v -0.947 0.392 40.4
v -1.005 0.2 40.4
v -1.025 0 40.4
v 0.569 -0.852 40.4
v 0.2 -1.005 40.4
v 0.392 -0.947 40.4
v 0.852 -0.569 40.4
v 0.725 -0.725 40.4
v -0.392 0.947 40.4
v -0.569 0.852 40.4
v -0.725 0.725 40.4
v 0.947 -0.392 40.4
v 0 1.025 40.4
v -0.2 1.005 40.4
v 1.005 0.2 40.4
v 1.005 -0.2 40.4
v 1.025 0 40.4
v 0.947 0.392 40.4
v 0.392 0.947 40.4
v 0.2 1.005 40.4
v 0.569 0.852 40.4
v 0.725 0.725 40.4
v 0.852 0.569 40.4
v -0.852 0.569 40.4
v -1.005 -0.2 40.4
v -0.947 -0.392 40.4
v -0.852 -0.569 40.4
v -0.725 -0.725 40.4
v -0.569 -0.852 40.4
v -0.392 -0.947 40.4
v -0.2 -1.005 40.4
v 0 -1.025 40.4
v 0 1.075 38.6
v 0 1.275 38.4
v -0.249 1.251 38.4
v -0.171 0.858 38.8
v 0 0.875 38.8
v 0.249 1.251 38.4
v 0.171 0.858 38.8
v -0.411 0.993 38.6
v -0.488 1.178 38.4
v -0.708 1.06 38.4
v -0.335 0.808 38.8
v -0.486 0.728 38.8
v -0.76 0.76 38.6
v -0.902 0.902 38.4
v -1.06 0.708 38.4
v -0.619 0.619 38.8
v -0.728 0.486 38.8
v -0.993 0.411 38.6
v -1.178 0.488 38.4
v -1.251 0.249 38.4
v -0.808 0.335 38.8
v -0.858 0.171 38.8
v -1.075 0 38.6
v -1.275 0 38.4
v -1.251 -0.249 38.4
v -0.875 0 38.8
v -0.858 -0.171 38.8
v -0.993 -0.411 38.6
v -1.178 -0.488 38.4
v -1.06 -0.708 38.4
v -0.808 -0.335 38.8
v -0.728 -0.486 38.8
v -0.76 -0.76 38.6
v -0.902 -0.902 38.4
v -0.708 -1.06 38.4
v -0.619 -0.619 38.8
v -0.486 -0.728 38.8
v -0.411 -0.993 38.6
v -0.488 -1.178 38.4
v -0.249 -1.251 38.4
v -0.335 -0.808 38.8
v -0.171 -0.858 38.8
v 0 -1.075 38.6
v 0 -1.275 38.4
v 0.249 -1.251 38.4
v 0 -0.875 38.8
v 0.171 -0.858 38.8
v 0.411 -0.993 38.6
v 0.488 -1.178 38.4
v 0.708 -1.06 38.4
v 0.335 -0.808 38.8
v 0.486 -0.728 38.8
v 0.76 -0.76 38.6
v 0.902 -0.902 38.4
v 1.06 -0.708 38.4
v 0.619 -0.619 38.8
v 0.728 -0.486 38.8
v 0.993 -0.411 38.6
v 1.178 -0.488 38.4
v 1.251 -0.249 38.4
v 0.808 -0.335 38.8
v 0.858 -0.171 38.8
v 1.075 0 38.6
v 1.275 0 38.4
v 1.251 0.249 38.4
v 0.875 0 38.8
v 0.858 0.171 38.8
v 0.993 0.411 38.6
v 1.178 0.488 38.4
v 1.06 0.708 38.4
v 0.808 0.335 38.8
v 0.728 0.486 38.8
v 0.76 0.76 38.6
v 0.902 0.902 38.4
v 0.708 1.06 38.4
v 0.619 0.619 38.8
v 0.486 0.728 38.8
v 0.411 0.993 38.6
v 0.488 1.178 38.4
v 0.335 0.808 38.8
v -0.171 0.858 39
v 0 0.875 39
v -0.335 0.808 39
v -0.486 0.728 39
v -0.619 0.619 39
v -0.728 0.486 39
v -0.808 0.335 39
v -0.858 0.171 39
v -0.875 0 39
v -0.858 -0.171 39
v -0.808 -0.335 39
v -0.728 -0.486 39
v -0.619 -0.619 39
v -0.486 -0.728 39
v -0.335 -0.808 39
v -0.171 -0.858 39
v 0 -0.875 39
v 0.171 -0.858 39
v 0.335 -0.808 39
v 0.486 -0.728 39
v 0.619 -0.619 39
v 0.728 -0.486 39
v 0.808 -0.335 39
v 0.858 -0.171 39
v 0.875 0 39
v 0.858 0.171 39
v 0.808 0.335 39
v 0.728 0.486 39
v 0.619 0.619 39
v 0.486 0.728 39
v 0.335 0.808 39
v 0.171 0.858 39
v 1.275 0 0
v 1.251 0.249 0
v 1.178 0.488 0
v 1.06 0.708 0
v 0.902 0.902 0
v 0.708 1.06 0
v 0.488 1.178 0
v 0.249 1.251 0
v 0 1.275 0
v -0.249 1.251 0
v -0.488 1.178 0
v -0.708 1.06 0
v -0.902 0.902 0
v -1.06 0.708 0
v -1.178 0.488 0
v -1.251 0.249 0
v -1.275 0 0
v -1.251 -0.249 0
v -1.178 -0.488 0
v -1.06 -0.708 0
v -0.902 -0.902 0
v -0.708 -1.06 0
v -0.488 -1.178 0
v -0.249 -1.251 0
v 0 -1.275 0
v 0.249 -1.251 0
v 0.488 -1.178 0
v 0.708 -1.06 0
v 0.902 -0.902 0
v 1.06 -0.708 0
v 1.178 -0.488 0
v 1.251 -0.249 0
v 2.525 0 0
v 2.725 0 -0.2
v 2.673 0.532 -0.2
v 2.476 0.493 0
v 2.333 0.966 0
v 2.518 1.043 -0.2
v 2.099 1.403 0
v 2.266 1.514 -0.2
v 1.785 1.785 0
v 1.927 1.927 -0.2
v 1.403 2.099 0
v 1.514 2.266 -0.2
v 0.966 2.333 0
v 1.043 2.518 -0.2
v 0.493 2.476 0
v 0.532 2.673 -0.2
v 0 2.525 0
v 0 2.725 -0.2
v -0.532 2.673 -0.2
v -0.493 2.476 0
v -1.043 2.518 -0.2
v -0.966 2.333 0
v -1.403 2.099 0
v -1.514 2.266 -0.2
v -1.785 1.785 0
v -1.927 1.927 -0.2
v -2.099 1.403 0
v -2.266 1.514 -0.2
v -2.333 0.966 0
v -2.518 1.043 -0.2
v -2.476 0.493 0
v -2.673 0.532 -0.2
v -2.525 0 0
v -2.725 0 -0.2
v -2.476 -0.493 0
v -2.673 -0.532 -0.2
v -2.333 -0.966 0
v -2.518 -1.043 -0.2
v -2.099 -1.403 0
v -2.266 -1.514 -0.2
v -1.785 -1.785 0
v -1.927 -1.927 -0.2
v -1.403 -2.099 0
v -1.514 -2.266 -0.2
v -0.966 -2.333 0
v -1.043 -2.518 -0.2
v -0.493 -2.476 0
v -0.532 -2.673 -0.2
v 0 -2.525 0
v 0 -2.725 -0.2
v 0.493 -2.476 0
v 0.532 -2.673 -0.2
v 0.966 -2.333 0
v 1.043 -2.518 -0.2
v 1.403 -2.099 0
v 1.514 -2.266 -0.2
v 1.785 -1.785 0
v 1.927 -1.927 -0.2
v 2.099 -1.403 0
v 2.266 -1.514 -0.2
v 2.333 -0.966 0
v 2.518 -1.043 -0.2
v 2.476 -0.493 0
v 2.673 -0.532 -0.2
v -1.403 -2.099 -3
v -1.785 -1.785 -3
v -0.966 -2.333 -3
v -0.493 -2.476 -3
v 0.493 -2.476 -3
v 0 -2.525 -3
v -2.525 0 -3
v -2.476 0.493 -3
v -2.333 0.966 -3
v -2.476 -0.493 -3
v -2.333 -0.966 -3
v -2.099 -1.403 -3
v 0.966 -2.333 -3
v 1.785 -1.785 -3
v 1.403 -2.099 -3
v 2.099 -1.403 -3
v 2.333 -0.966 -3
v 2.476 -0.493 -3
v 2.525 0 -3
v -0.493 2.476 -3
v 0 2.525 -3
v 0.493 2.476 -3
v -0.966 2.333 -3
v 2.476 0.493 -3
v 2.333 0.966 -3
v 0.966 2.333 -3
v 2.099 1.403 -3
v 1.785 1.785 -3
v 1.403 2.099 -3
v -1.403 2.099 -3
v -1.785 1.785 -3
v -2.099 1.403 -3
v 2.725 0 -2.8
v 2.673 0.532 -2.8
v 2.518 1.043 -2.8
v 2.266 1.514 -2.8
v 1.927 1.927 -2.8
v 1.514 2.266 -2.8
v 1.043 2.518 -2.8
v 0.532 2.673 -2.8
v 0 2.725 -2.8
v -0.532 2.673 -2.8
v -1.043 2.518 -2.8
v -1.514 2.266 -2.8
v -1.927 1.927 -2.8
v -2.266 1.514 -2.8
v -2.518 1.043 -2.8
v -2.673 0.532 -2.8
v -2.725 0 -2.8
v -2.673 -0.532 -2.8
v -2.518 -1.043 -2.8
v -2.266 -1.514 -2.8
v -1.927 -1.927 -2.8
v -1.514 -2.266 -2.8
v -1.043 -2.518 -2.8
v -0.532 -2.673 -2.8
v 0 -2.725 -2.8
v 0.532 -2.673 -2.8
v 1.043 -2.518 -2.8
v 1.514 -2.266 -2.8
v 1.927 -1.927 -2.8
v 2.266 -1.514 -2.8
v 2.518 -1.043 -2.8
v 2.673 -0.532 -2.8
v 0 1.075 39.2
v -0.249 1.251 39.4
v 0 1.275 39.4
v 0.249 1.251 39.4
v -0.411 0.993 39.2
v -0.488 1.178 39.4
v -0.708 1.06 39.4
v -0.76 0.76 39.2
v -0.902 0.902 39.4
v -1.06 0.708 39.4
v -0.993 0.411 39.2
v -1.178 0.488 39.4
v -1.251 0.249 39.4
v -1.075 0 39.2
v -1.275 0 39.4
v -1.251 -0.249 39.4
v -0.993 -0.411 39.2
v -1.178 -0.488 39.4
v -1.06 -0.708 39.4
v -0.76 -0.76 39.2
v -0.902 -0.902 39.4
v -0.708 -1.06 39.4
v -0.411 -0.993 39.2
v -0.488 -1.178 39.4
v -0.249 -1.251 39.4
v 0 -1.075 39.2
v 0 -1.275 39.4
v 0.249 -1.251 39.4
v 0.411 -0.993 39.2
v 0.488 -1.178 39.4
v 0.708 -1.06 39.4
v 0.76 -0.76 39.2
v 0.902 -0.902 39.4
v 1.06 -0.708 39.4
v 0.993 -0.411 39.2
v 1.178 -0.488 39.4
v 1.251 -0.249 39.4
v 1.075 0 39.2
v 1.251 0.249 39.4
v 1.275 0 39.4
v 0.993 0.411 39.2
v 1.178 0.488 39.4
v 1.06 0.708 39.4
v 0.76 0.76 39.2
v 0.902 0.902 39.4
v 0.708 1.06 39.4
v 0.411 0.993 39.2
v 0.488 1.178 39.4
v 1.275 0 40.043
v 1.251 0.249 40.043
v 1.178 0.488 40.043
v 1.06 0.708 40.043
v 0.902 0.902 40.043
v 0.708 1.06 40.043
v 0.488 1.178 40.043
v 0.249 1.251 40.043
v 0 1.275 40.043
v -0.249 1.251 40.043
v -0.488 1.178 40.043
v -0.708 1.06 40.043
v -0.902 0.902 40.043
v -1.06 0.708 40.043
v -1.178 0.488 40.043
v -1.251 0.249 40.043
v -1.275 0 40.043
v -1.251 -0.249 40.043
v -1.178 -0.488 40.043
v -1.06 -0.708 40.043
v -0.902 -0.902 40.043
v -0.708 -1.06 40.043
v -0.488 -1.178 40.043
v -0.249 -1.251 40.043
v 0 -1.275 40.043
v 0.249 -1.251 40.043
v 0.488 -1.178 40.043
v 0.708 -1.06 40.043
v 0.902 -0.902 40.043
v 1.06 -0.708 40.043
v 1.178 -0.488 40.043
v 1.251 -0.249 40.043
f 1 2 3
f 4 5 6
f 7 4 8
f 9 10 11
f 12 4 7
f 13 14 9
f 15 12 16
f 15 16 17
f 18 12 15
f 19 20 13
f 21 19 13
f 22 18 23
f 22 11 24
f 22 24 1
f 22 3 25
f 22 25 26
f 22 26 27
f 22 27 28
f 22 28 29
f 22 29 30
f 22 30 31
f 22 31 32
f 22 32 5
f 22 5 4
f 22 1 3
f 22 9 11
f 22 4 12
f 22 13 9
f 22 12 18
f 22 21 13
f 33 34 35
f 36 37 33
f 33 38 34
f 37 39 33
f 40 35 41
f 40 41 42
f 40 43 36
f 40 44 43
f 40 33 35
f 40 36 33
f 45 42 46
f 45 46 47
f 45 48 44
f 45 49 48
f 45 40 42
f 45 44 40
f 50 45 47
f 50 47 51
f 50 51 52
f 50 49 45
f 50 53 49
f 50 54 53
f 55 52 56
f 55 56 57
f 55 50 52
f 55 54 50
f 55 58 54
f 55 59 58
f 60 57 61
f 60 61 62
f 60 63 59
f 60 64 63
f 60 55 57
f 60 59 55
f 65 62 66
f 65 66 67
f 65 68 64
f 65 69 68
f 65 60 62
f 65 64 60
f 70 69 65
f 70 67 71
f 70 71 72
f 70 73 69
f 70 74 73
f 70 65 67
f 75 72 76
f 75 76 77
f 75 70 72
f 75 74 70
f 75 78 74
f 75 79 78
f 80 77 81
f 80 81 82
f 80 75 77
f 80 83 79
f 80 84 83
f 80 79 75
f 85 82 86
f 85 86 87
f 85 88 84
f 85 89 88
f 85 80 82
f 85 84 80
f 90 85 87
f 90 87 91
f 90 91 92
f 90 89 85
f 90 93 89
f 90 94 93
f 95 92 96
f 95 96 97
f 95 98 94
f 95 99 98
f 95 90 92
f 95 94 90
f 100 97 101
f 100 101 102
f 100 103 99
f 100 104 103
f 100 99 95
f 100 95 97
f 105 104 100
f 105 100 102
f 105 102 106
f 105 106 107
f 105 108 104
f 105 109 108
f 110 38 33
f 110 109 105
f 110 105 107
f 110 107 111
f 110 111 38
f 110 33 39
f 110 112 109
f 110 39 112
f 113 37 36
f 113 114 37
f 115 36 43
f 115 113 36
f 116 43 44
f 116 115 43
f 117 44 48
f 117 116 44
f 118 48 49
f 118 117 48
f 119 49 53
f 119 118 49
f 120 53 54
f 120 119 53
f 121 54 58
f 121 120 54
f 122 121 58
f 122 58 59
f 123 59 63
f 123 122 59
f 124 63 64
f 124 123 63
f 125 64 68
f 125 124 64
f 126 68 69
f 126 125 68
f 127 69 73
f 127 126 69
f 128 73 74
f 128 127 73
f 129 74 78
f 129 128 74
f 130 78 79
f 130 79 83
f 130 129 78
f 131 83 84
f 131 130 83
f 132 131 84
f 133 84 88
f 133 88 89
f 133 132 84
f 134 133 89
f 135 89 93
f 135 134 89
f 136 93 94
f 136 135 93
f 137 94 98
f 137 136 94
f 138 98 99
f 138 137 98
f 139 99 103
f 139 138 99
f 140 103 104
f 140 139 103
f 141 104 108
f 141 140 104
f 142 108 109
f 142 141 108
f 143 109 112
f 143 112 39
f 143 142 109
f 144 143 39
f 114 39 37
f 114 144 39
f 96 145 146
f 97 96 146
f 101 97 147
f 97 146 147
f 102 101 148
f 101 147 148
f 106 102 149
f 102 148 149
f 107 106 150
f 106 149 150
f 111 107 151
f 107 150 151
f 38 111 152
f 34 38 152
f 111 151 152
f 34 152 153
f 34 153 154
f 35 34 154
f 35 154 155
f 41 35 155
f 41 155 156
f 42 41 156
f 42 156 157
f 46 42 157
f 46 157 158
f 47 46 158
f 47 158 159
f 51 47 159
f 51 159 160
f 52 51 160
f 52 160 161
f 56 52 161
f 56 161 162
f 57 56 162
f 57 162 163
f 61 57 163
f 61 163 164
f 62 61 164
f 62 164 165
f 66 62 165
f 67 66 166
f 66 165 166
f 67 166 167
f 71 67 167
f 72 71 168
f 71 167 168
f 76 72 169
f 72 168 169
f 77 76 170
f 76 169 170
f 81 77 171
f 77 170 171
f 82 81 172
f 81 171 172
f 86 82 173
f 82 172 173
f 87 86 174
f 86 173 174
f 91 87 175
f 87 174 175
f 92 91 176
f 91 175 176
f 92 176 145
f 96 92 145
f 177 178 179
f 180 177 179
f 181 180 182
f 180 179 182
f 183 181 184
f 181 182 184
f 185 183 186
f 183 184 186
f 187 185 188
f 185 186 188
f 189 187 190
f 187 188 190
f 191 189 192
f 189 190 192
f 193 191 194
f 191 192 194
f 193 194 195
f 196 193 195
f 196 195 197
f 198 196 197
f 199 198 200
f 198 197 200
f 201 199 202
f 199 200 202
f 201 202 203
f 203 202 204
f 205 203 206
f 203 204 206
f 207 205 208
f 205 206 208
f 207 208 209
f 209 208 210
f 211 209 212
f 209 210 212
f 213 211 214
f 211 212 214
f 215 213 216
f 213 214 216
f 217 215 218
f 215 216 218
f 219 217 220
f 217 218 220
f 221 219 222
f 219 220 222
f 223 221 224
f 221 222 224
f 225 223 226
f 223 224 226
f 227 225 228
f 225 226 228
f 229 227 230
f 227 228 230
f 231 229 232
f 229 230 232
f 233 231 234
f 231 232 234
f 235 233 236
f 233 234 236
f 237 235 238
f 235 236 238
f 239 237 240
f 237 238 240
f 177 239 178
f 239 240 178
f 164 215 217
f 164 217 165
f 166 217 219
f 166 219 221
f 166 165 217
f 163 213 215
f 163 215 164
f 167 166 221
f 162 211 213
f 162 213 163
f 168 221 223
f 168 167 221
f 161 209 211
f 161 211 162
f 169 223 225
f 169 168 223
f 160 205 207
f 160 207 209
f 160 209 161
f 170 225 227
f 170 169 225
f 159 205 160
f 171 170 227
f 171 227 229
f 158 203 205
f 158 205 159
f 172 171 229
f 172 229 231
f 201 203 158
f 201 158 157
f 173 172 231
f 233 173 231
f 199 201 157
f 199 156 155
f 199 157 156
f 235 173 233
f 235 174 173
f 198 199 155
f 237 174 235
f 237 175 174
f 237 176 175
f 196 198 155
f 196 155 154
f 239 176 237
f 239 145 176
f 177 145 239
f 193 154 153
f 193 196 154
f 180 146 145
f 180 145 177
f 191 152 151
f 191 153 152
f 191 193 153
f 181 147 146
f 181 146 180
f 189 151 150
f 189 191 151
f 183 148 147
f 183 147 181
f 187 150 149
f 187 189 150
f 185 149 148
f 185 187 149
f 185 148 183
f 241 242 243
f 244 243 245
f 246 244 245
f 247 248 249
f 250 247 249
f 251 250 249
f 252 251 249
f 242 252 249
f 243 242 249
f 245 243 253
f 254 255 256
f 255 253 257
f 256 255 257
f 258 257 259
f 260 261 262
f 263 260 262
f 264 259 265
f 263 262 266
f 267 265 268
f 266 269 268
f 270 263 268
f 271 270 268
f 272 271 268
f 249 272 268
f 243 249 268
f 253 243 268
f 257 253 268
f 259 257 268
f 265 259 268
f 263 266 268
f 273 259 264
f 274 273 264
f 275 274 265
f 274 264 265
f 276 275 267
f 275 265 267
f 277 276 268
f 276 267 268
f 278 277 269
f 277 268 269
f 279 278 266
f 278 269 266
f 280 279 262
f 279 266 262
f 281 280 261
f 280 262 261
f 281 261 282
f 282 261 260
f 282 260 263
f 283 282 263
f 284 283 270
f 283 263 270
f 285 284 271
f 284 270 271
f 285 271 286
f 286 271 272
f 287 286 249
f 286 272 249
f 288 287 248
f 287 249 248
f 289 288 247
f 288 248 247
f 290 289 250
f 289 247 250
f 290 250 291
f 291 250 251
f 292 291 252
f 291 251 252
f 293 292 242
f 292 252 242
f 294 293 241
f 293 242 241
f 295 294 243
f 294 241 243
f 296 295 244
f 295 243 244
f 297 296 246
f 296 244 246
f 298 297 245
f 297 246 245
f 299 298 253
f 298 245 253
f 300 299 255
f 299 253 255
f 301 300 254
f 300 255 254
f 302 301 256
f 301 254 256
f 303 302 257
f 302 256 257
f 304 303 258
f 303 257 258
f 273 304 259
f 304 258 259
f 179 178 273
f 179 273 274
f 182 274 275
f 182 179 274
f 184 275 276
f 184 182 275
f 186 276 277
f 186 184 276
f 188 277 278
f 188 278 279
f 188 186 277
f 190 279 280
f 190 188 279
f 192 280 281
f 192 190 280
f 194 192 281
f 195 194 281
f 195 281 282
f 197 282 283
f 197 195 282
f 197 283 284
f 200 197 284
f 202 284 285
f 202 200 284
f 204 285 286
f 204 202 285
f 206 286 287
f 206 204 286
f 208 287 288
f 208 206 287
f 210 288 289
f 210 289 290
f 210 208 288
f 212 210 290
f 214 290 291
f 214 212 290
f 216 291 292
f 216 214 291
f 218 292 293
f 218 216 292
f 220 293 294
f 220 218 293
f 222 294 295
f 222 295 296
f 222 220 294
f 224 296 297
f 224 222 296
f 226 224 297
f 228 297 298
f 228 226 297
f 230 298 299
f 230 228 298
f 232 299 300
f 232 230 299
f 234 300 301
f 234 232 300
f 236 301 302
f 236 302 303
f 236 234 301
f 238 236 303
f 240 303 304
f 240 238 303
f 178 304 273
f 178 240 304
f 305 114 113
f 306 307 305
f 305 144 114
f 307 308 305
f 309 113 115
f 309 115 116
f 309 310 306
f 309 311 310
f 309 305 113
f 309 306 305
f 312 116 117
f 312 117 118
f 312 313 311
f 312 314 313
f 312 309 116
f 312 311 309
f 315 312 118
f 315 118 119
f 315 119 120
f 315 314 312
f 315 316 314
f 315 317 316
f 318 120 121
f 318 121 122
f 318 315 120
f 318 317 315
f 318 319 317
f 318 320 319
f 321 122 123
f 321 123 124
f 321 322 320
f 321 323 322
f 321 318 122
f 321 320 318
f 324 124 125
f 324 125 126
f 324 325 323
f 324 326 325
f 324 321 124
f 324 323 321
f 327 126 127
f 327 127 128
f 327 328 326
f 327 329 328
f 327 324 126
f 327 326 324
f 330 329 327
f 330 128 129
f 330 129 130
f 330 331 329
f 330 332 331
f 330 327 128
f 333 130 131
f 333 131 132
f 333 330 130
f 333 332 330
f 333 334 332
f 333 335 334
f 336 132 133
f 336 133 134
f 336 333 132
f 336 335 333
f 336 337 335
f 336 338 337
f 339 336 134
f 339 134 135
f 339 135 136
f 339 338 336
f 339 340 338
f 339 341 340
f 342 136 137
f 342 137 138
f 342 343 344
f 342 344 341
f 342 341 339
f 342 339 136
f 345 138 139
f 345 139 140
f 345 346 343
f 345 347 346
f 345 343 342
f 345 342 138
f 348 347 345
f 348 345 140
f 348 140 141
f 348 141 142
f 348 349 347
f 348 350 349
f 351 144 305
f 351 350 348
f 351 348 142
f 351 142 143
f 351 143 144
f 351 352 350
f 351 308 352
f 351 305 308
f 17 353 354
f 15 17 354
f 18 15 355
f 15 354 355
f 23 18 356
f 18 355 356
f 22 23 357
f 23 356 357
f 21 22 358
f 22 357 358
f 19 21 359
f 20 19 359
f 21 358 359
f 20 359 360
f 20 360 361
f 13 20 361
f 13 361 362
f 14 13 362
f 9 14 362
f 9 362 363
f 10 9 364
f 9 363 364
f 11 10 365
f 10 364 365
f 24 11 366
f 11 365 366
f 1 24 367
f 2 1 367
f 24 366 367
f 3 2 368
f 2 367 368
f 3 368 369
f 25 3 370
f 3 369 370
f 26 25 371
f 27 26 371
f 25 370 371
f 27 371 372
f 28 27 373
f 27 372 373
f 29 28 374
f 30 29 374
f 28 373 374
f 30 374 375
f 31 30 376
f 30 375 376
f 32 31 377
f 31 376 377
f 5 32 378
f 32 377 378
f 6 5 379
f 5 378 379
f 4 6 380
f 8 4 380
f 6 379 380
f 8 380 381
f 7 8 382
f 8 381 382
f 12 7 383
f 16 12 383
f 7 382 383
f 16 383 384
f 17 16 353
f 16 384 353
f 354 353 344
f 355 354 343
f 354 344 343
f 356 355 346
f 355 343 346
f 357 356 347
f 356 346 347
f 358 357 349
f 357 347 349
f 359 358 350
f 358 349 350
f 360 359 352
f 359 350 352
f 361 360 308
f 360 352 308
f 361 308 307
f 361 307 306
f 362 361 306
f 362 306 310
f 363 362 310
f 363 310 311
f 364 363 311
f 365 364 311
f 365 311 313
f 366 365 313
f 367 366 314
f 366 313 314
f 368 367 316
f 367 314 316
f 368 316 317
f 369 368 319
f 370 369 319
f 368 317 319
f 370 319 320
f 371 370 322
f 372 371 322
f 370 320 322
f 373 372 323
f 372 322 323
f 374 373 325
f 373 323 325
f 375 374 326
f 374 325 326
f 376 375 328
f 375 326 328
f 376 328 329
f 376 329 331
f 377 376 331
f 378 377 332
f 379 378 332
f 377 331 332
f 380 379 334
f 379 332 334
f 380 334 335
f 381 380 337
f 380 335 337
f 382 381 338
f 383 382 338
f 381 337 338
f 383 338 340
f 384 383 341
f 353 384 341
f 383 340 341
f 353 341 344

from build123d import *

# Parameters (mm, degrees)
SKETCH2_R      = 1.275
SHAFT_DEPTH    = 40.4
SKETCH5_R      = 2.725
HEAD_DEPTH     = 3
CHAMFER1_SIZE  = 0.25
CHAMFER1_SIZE2 = 0.357037002
DEBURS_SIZE    = 0.2


with BuildPart() as part:
    # Sketch2 → Shaft (new body)
    with BuildSketch(Plane.XY):
        Circle(SKETCH2_R)
    extrude(amount=SHAFT_DEPTH)

    # Sketch5 → Head (add)
    with BuildSketch(Plane.XY):
        Circle(SKETCH5_R)
    extrude(amount=-HEAD_DEPTH)

    # Chamfer1
    chamfer1_edges = [part.edges().sort_by_distance(p)[0] for p in [
        (-1.275, 0, 40.4),
    ]]
    chamfer1_side = [part.faces().sort_by_distance(p)[0] for p in [
        (0, 0, 40.4),
    ]]
    chamfer(chamfer1_edges, length=CHAMFER1_SIZE, length2=CHAMFER1_SIZE2, reference=chamfer1_side[0])

    # Deburs
    deburs_edges = [part.edges().sort_by_distance(p)[0] for p in [
        (-2.725, 0, -3),
        (-2.725, 0, 0),
    ]]
    chamfer(deburs_edges, length=DEBURS_SIZE)

    # Sketch6 → e-Clip Notch Long (revolve, cut)
    with BuildSketch(Plane(origin=(0, 0, 0), x_dir=(0, 0, -1), z_dir=(1, 0, 0))):
        Polygon((-39.4, 1.275), (-38.4, 1.275), (-38.8, 0.875), (-39, 0.875), align=None)
    revolve(axis=Axis((0, 0, 0), (0, 0, 1)), mode=Mode.SUBTRACT)


solid = part.part
